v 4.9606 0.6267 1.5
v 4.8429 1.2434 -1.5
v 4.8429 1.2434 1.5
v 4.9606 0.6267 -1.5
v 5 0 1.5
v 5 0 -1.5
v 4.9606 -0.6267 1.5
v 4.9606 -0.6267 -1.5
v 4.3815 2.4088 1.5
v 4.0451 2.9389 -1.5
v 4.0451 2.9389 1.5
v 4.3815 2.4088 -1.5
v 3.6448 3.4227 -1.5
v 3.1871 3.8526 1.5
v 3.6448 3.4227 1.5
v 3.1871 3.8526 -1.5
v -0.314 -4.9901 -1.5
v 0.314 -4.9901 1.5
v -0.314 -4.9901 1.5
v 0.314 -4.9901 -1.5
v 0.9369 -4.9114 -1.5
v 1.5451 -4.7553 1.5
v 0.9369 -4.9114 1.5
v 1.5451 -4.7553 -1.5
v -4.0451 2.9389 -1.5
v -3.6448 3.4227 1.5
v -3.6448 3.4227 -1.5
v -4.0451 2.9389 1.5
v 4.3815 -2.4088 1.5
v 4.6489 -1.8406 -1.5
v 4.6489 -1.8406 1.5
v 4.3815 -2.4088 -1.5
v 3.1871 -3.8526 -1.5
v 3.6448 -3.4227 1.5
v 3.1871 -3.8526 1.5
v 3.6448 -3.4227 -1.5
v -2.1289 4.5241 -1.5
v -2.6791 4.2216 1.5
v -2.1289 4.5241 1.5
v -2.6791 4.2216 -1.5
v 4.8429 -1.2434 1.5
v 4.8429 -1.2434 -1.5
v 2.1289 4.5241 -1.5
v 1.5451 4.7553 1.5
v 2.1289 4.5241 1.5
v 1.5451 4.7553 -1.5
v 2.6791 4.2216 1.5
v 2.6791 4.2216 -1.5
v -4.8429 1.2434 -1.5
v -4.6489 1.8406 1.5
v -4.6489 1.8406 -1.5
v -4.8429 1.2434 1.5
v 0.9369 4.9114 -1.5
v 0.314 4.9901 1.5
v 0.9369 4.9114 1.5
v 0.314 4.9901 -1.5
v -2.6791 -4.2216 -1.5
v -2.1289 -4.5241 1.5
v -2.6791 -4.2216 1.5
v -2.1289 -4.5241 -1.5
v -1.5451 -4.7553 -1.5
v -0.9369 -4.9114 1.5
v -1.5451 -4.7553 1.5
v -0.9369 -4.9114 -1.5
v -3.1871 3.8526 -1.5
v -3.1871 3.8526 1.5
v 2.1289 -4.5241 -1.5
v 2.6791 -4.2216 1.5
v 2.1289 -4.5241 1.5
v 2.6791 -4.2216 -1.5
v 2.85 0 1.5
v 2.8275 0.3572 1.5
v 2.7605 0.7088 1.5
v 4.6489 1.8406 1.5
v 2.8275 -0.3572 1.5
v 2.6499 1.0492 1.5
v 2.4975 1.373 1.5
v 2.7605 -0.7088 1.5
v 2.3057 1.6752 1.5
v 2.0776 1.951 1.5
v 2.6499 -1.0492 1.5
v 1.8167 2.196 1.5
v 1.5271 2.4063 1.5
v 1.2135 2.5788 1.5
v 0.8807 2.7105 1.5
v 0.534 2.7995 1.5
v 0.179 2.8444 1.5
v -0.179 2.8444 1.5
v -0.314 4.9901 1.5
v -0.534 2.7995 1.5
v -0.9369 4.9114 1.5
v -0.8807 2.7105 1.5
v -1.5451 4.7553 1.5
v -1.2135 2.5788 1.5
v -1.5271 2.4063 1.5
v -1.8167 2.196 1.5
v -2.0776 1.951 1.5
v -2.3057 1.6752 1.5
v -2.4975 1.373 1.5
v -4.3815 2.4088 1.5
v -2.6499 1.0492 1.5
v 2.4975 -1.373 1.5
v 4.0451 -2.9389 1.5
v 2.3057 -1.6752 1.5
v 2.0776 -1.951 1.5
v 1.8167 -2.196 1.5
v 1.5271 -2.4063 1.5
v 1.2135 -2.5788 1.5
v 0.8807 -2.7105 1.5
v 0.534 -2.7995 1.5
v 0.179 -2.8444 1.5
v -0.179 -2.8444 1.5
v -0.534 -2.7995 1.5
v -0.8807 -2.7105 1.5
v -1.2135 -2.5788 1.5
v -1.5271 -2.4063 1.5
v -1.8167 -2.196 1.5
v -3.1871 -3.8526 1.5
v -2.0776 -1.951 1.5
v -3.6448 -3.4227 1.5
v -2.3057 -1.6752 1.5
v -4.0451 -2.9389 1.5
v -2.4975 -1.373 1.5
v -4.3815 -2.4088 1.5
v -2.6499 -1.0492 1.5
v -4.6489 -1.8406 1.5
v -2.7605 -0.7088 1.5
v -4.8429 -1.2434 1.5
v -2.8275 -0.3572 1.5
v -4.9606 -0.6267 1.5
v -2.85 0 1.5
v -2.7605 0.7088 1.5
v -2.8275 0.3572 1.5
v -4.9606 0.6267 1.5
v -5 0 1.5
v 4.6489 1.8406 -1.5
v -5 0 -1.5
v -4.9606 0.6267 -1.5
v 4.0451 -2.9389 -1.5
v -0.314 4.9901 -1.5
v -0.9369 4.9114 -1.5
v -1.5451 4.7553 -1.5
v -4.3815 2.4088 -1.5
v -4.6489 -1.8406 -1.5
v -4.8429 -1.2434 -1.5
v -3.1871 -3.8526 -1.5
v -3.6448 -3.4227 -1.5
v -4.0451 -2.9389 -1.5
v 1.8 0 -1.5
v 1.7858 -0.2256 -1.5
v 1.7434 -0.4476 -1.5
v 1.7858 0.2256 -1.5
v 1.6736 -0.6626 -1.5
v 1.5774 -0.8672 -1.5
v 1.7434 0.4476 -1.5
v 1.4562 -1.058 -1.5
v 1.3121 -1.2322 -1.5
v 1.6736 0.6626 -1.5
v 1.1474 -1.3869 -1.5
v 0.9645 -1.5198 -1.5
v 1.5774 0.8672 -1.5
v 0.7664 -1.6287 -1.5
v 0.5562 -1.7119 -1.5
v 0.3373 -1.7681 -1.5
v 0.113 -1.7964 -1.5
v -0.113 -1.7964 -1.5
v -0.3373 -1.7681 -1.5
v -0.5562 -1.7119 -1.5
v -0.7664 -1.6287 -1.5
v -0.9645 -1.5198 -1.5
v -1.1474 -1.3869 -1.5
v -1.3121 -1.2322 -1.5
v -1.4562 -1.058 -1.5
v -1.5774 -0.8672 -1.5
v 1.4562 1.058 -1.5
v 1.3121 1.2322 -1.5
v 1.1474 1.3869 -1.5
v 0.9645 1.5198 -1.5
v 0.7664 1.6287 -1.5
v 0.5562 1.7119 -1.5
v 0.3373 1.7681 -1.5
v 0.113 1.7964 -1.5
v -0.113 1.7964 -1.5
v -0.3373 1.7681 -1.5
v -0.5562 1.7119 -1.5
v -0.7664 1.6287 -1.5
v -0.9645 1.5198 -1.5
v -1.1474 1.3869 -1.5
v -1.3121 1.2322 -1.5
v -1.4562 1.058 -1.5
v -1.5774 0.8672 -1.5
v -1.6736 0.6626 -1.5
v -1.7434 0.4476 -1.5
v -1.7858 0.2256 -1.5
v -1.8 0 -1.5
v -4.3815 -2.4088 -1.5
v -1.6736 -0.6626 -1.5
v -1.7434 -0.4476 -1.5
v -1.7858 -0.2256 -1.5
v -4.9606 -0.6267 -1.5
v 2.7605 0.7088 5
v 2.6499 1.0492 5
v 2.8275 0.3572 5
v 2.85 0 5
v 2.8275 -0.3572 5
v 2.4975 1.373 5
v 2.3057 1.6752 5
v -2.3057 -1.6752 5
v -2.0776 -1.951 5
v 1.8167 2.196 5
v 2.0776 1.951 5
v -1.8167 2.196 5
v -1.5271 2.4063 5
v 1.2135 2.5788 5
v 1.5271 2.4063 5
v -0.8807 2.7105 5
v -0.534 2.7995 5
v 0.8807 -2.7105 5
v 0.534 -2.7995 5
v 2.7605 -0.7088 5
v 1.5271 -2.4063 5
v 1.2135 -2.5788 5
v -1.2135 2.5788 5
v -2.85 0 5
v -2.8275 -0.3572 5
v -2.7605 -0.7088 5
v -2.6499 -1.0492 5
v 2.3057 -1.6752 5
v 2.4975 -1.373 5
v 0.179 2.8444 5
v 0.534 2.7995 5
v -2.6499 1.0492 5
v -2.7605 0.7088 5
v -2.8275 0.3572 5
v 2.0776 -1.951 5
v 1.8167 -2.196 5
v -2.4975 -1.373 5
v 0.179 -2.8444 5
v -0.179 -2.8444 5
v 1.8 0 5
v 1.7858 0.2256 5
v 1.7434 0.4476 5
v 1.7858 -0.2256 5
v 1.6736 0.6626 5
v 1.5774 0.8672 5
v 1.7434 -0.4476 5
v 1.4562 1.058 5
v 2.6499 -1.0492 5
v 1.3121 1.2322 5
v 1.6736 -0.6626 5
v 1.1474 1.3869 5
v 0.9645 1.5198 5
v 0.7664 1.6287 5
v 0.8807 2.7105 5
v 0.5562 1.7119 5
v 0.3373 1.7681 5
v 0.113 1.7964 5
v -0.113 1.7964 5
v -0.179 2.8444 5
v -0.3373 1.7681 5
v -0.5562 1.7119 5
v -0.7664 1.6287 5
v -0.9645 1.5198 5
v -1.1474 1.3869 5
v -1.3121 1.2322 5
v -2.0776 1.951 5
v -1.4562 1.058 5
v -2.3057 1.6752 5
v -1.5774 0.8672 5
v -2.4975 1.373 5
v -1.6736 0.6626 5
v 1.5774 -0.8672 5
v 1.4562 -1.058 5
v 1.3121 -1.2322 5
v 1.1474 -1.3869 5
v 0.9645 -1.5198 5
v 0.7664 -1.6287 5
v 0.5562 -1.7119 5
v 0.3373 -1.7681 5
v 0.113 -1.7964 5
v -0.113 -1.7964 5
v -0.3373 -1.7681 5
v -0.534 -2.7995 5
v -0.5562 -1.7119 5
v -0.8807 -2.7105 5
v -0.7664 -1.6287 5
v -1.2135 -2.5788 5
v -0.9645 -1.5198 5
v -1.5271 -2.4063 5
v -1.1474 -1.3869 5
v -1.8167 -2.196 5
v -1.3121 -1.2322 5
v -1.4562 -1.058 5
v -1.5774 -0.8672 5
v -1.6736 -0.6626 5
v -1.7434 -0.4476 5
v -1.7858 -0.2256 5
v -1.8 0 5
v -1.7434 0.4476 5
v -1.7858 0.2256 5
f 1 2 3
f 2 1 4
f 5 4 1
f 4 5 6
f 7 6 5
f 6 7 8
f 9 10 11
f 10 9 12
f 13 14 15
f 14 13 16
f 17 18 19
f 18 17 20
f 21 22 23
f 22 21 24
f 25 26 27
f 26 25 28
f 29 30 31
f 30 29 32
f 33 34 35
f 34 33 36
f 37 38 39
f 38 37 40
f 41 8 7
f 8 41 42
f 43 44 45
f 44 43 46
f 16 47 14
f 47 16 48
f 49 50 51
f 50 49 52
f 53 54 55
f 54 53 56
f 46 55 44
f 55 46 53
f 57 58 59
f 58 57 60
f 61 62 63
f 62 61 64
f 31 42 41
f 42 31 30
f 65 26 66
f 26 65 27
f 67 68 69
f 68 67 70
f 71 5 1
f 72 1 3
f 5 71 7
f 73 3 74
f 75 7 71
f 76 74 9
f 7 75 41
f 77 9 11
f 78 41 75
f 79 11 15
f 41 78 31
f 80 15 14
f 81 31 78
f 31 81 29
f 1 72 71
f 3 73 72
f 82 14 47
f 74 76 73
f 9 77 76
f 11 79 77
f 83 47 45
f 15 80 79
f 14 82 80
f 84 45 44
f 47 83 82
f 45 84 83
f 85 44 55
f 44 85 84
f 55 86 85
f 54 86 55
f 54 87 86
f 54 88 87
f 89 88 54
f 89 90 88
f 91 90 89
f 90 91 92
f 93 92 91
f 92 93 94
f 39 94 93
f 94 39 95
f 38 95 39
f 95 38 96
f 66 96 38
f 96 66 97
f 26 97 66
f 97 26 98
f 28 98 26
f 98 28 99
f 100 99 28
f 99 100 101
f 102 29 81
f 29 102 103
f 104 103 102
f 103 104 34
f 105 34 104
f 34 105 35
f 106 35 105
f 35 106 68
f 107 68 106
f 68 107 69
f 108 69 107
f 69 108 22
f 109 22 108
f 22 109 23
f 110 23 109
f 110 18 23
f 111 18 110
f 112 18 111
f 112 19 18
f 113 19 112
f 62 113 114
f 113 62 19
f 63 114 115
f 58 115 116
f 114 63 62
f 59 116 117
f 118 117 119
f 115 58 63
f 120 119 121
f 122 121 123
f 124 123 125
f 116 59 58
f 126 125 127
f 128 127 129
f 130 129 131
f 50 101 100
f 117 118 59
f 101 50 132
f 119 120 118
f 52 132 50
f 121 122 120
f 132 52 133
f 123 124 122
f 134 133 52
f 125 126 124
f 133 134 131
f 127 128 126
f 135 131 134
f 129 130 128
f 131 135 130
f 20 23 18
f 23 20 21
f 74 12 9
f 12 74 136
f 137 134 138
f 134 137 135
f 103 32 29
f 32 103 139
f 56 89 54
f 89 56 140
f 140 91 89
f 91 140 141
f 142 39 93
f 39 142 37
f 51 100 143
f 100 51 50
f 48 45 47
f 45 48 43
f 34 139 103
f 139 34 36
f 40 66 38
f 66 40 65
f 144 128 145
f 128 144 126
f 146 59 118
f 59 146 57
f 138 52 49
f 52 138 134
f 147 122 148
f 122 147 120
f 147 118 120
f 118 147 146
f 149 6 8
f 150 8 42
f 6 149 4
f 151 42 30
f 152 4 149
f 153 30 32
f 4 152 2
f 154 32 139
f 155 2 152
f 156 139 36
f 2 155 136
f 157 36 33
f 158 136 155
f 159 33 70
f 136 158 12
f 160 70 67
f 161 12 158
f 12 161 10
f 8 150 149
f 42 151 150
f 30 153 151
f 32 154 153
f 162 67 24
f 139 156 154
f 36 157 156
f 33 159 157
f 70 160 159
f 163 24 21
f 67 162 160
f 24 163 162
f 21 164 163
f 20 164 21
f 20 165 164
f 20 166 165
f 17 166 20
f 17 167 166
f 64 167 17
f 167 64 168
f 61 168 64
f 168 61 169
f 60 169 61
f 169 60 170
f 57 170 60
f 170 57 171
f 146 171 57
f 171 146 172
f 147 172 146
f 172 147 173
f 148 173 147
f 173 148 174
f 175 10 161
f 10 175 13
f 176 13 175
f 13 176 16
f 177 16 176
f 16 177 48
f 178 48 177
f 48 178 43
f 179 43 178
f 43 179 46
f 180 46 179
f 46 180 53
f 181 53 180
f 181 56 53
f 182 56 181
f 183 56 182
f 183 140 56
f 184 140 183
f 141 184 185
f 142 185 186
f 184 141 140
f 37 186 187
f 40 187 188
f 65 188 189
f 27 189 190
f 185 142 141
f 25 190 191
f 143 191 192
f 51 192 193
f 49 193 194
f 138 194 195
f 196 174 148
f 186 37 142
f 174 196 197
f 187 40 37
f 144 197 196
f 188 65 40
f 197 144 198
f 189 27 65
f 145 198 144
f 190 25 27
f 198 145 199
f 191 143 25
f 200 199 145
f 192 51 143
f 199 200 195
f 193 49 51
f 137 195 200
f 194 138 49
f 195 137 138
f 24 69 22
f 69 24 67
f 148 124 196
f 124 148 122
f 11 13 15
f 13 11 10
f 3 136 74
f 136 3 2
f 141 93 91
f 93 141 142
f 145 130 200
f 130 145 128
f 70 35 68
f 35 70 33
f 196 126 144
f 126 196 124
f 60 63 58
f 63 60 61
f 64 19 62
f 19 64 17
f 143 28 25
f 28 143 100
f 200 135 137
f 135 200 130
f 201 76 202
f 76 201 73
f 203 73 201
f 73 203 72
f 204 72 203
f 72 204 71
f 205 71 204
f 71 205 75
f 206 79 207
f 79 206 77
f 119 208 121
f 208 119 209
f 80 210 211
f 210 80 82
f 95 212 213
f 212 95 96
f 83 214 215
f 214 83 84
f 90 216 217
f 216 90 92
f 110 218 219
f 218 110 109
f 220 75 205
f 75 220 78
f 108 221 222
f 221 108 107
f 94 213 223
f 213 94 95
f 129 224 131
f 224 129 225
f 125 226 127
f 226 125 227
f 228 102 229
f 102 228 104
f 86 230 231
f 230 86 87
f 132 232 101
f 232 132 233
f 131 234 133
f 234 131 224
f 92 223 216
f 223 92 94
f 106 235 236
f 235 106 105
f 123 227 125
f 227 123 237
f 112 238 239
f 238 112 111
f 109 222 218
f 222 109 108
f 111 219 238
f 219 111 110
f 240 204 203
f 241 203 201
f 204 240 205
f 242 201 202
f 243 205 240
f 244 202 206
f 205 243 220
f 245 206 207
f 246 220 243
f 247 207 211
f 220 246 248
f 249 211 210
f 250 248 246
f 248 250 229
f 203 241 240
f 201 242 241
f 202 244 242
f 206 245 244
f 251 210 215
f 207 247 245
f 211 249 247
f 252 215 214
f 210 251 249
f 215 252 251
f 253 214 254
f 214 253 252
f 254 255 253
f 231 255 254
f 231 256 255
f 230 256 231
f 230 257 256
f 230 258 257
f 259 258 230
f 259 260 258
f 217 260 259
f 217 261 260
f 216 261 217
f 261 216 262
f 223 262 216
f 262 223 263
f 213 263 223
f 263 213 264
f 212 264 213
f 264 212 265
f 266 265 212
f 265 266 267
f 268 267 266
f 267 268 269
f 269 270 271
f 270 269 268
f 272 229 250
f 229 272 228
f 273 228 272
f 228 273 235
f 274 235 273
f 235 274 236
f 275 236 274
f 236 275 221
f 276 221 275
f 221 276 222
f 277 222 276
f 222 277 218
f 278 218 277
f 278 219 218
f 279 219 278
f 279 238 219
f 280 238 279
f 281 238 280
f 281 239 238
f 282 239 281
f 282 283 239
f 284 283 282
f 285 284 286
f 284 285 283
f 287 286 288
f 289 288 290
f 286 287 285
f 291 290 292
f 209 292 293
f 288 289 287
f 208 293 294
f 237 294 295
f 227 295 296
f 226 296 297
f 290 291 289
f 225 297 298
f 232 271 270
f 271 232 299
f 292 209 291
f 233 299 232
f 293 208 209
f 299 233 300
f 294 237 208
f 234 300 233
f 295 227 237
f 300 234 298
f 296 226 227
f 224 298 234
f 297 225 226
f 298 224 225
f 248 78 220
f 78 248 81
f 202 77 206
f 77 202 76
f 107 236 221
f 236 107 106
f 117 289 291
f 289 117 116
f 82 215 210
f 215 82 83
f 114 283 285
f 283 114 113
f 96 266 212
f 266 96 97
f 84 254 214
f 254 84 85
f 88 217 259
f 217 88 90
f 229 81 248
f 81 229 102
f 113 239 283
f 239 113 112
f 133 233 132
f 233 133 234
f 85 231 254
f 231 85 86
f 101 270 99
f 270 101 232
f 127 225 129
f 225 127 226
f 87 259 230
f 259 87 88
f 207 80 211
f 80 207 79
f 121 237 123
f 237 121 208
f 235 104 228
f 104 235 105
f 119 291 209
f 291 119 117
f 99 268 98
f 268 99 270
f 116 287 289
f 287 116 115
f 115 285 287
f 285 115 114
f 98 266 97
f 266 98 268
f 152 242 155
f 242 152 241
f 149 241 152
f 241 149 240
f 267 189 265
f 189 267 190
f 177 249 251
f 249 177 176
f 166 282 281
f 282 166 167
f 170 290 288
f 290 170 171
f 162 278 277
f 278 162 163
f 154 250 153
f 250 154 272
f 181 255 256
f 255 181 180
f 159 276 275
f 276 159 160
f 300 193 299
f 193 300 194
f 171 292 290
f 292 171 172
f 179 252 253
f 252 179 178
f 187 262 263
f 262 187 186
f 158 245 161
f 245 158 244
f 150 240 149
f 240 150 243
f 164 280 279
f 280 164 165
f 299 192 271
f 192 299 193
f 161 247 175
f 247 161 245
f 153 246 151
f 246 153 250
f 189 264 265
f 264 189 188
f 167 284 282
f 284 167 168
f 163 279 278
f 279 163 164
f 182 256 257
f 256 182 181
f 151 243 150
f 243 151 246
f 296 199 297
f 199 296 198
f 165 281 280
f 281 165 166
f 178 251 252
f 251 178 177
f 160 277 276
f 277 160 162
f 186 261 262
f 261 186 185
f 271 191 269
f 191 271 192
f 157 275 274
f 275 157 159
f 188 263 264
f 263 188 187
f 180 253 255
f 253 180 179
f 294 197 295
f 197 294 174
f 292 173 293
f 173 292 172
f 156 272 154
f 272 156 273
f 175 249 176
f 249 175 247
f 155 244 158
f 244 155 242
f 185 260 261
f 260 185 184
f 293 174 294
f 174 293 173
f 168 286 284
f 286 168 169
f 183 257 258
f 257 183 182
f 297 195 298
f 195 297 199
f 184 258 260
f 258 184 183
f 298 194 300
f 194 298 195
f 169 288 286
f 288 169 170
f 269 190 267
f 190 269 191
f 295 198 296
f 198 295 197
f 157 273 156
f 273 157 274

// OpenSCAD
$fn = 50;


difference() {
	union() {
		translate(v = [0, 0, -1.5000000000]) {
			cylinder(h = 3, r = 5.0000000000);
		}
		translate(v = [0, 0, -1.5000000000]) {
			cylinder(h = 6.5000000000, r = 2.8500000000);
		}
	}
	union() {
		translate(v = [0, 0, -100.0000000000]) {
			cylinder(h = 200, r = 1.8000000000);
		}
	}
}
